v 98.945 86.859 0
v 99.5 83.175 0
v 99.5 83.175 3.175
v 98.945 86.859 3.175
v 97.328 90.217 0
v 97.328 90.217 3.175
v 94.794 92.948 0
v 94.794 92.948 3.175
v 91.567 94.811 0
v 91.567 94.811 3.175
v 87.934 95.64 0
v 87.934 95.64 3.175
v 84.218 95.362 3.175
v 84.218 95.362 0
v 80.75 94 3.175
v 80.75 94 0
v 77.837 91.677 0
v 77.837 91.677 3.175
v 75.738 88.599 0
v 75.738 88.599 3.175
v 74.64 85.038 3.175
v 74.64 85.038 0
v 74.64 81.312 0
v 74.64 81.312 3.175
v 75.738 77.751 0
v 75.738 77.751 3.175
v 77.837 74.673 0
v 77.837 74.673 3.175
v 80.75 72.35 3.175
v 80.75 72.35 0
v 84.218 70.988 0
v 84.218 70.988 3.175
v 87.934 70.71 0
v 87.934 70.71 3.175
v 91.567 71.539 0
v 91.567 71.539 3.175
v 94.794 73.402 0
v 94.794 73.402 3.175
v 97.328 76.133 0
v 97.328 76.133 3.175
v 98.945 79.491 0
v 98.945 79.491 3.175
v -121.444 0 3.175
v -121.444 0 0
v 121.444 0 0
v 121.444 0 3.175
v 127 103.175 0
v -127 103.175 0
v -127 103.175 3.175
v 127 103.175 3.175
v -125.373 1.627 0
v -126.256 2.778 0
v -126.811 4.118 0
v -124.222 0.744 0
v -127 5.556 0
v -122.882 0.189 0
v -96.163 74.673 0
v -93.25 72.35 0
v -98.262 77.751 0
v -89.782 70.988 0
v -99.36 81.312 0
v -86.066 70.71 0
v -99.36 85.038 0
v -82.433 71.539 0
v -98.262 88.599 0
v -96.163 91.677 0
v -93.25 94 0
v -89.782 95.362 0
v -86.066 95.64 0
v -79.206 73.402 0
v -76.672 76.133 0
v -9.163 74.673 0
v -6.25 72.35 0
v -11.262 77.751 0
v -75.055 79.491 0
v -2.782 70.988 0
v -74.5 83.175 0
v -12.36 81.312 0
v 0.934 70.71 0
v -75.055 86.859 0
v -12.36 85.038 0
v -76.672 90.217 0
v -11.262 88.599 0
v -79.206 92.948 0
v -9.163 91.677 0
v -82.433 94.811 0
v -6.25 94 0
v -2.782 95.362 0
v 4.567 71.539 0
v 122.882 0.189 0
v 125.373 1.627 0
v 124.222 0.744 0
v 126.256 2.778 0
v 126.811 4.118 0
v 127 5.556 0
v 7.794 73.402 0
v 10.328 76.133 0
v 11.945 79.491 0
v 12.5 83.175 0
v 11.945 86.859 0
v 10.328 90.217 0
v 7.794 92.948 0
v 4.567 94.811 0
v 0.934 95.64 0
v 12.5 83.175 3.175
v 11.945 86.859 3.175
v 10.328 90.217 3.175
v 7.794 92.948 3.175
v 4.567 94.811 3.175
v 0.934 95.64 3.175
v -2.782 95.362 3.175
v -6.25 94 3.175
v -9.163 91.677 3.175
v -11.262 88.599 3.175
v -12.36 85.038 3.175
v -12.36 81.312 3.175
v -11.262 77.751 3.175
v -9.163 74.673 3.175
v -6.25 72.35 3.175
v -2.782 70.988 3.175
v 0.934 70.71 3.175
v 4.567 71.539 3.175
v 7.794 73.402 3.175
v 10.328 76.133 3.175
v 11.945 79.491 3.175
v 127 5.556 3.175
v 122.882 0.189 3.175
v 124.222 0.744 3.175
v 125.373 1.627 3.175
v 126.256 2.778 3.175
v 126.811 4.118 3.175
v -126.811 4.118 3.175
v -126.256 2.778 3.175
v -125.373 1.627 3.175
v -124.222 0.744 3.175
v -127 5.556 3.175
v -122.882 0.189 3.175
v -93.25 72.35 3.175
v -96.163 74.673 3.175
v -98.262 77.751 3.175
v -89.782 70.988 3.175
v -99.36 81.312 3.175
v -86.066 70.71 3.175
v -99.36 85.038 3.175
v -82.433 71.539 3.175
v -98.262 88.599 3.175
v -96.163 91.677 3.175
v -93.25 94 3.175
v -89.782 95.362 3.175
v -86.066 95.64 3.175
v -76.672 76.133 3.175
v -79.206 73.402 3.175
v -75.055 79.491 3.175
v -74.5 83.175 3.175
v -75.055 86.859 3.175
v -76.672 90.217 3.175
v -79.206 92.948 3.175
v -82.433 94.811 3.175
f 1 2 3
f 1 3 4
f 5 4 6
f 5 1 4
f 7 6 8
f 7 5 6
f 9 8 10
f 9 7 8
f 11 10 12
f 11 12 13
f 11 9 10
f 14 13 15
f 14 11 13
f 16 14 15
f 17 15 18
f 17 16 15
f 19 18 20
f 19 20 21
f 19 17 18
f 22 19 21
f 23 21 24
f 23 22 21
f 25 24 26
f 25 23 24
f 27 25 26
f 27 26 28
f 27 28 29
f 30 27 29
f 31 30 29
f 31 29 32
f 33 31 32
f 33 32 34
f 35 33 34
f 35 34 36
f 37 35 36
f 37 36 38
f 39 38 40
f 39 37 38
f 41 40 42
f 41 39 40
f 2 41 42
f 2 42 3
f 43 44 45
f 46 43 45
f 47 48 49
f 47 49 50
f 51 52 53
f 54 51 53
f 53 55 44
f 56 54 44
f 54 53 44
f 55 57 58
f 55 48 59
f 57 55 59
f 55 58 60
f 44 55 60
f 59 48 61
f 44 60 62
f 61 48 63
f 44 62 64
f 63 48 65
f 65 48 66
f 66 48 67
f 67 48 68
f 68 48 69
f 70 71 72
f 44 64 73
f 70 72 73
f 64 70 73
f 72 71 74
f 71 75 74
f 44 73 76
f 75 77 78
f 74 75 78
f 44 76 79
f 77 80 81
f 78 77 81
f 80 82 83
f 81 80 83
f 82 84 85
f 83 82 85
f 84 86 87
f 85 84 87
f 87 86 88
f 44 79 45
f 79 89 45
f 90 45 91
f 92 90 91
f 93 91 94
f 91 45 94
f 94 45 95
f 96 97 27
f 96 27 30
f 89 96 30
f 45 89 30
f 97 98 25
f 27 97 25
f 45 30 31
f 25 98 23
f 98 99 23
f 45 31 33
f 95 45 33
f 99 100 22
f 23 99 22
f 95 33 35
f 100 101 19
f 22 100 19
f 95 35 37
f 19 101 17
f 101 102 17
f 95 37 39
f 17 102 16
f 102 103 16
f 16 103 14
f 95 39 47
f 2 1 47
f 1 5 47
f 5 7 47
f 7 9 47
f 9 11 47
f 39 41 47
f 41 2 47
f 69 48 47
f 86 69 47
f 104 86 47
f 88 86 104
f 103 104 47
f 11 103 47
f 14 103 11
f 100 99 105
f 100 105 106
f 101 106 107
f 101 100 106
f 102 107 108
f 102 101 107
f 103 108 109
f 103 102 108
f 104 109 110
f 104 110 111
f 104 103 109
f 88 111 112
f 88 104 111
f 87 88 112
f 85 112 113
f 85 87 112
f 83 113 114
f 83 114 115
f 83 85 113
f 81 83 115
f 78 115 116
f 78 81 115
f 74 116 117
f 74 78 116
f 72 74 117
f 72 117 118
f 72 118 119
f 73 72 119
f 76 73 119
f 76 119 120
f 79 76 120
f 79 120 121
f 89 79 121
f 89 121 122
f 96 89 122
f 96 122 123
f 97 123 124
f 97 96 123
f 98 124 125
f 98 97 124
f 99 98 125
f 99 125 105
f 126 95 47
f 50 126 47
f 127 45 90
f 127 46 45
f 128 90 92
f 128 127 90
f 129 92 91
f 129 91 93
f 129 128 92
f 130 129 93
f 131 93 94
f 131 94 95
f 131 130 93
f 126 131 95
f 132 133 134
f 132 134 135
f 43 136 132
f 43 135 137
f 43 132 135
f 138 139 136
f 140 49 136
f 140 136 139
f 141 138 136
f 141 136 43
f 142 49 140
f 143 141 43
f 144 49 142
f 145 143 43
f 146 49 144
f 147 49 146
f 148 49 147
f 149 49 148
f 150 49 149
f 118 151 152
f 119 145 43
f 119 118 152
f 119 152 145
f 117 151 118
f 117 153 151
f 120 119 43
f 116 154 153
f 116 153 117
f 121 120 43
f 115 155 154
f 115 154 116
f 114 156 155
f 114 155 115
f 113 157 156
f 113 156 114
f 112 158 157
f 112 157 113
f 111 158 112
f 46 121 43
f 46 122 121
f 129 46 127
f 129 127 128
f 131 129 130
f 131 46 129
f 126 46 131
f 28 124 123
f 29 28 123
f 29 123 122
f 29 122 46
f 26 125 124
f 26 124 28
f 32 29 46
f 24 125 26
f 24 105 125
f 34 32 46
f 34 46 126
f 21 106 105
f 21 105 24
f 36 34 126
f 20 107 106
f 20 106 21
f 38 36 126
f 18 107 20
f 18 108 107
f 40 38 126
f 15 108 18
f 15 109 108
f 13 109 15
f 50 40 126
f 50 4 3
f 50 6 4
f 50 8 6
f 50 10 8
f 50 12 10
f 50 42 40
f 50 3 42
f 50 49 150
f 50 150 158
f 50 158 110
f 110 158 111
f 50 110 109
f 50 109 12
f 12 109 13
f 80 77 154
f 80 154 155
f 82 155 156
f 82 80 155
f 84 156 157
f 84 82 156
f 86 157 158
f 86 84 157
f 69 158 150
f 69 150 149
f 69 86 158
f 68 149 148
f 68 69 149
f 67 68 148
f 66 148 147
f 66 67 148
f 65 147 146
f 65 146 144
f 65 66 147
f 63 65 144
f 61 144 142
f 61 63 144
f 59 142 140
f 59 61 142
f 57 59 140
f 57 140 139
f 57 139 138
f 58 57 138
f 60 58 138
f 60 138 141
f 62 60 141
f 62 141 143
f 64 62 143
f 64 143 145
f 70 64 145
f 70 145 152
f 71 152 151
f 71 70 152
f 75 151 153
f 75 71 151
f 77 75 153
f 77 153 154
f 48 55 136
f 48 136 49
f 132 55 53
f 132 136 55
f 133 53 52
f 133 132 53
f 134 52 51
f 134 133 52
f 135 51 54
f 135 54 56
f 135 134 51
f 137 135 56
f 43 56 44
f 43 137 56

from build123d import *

# Parameters (mm, degrees)
SKETCH1_W           = 254
SKETCH1_H           = 103.175
SKETCH1_R           = 12.5
BOSS_EXTRUDE1_DEPTH = 3.175
FILLET1_R           = 5.55625


with BuildPart() as part:
    # Sketch1 → Boss-Extrude1 (new body)
    with BuildSketch(Plane.XY):
        with Locations((0, 51.5875)):
            Rectangle(SKETCH1_W, SKETCH1_H)
        with Locations((87, 83.175)):
            Circle(SKETCH1_R, mode=Mode.SUBTRACT)
        with Locations((-87, 83.175)):
            Circle(SKETCH1_R, mode=Mode.SUBTRACT)
        with Locations((0, 83.175)):
            Circle(SKETCH1_R, mode=Mode.SUBTRACT)
    extrude(amount=BOSS_EXTRUDE1_DEPTH)

    # Fillet1
    fillet1_edges = [part.edges().sort_by_distance(p)[0] for p in [
        (127, 0, 1.5875),
        (-127, 0, 1.5875),
    ]]
    fillet(fillet1_edges, radius=FILLET1_R)


solid = part.part
